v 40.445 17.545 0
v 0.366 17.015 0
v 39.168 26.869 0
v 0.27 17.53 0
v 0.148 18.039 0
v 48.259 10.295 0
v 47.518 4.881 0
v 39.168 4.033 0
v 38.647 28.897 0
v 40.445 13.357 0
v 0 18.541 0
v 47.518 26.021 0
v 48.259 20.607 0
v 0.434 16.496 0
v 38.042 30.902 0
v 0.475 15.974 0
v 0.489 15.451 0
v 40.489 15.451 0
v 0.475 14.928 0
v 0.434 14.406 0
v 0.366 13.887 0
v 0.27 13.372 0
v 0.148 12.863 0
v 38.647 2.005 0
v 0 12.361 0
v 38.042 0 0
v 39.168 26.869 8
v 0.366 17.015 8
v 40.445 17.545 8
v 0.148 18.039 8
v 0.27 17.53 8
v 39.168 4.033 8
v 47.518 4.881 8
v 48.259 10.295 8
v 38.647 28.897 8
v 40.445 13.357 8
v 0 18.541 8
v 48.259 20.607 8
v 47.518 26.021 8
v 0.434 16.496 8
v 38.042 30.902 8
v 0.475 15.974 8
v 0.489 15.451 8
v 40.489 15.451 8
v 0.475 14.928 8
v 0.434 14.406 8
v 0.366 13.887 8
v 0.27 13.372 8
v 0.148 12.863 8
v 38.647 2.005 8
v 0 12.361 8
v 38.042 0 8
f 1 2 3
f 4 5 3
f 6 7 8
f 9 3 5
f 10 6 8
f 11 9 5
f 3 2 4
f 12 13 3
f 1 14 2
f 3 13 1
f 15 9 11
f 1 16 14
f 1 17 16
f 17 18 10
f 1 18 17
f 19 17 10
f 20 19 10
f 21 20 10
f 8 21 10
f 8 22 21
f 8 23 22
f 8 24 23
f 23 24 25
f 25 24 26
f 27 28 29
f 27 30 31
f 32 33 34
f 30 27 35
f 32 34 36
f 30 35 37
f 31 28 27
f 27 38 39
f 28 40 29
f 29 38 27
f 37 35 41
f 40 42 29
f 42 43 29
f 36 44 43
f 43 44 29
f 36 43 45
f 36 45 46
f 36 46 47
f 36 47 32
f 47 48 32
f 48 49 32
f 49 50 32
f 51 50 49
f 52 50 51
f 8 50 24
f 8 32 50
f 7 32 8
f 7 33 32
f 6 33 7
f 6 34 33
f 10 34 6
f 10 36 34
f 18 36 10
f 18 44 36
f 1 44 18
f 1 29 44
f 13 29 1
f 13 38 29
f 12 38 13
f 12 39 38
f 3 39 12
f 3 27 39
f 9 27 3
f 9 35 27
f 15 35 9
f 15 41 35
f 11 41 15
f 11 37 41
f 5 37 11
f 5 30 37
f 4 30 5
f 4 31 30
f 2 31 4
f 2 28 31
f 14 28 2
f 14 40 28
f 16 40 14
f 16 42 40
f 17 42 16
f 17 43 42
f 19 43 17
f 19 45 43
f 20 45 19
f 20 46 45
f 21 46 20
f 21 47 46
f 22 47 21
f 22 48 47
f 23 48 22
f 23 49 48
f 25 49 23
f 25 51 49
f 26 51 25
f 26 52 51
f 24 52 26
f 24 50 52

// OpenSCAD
$fn = 32;

// ----------------------------------------------------------------------
// Gear sector: 2 teeth on 36 degrees
// ----------------------------------------------------------------------

// --- parameters (mm) ---
sector_angle = 36;        // sector angle, degrees
root_r = 50;              // root circle radius
tooth_h = 8;              // tooth height over the root circle
teeth = 2;                // number of teeth on the sector
hub_r = 10;               // hub bore radius
plate_t = 8;              // sector thickness, Z
arc_step = 3;             // sampling step of the root/hub arcs, degrees

tip_r = root_r + tooth_h;  // tip circle radius

profile = [[38.042, 0], [38.647, 2.005], [39.168, 4.033], [47.518, 4.881], [48.259, 10.295], [40.445, 13.357], [40.489, 15.451], [40.445, 17.545], [48.259, 20.607], [47.518, 26.021], [39.168, 26.869], [38.647, 28.897], [38.042, 30.902], [0, 18.541], [0.148, 18.039], [0.27, 17.53], [0.366, 17.015], [0.434, 16.496], [0.475, 15.974], [0.489, 15.451], [0.475, 14.928], [0.434, 14.406], [0.366, 13.887], [0.27, 13.372], [0.148, 12.863], [0, 12.361]];  // primary outline, 26 points, counter clockwise

// --- the one profile operation ---
linear_extrude(height = plate_t) polygon(points = profile);
